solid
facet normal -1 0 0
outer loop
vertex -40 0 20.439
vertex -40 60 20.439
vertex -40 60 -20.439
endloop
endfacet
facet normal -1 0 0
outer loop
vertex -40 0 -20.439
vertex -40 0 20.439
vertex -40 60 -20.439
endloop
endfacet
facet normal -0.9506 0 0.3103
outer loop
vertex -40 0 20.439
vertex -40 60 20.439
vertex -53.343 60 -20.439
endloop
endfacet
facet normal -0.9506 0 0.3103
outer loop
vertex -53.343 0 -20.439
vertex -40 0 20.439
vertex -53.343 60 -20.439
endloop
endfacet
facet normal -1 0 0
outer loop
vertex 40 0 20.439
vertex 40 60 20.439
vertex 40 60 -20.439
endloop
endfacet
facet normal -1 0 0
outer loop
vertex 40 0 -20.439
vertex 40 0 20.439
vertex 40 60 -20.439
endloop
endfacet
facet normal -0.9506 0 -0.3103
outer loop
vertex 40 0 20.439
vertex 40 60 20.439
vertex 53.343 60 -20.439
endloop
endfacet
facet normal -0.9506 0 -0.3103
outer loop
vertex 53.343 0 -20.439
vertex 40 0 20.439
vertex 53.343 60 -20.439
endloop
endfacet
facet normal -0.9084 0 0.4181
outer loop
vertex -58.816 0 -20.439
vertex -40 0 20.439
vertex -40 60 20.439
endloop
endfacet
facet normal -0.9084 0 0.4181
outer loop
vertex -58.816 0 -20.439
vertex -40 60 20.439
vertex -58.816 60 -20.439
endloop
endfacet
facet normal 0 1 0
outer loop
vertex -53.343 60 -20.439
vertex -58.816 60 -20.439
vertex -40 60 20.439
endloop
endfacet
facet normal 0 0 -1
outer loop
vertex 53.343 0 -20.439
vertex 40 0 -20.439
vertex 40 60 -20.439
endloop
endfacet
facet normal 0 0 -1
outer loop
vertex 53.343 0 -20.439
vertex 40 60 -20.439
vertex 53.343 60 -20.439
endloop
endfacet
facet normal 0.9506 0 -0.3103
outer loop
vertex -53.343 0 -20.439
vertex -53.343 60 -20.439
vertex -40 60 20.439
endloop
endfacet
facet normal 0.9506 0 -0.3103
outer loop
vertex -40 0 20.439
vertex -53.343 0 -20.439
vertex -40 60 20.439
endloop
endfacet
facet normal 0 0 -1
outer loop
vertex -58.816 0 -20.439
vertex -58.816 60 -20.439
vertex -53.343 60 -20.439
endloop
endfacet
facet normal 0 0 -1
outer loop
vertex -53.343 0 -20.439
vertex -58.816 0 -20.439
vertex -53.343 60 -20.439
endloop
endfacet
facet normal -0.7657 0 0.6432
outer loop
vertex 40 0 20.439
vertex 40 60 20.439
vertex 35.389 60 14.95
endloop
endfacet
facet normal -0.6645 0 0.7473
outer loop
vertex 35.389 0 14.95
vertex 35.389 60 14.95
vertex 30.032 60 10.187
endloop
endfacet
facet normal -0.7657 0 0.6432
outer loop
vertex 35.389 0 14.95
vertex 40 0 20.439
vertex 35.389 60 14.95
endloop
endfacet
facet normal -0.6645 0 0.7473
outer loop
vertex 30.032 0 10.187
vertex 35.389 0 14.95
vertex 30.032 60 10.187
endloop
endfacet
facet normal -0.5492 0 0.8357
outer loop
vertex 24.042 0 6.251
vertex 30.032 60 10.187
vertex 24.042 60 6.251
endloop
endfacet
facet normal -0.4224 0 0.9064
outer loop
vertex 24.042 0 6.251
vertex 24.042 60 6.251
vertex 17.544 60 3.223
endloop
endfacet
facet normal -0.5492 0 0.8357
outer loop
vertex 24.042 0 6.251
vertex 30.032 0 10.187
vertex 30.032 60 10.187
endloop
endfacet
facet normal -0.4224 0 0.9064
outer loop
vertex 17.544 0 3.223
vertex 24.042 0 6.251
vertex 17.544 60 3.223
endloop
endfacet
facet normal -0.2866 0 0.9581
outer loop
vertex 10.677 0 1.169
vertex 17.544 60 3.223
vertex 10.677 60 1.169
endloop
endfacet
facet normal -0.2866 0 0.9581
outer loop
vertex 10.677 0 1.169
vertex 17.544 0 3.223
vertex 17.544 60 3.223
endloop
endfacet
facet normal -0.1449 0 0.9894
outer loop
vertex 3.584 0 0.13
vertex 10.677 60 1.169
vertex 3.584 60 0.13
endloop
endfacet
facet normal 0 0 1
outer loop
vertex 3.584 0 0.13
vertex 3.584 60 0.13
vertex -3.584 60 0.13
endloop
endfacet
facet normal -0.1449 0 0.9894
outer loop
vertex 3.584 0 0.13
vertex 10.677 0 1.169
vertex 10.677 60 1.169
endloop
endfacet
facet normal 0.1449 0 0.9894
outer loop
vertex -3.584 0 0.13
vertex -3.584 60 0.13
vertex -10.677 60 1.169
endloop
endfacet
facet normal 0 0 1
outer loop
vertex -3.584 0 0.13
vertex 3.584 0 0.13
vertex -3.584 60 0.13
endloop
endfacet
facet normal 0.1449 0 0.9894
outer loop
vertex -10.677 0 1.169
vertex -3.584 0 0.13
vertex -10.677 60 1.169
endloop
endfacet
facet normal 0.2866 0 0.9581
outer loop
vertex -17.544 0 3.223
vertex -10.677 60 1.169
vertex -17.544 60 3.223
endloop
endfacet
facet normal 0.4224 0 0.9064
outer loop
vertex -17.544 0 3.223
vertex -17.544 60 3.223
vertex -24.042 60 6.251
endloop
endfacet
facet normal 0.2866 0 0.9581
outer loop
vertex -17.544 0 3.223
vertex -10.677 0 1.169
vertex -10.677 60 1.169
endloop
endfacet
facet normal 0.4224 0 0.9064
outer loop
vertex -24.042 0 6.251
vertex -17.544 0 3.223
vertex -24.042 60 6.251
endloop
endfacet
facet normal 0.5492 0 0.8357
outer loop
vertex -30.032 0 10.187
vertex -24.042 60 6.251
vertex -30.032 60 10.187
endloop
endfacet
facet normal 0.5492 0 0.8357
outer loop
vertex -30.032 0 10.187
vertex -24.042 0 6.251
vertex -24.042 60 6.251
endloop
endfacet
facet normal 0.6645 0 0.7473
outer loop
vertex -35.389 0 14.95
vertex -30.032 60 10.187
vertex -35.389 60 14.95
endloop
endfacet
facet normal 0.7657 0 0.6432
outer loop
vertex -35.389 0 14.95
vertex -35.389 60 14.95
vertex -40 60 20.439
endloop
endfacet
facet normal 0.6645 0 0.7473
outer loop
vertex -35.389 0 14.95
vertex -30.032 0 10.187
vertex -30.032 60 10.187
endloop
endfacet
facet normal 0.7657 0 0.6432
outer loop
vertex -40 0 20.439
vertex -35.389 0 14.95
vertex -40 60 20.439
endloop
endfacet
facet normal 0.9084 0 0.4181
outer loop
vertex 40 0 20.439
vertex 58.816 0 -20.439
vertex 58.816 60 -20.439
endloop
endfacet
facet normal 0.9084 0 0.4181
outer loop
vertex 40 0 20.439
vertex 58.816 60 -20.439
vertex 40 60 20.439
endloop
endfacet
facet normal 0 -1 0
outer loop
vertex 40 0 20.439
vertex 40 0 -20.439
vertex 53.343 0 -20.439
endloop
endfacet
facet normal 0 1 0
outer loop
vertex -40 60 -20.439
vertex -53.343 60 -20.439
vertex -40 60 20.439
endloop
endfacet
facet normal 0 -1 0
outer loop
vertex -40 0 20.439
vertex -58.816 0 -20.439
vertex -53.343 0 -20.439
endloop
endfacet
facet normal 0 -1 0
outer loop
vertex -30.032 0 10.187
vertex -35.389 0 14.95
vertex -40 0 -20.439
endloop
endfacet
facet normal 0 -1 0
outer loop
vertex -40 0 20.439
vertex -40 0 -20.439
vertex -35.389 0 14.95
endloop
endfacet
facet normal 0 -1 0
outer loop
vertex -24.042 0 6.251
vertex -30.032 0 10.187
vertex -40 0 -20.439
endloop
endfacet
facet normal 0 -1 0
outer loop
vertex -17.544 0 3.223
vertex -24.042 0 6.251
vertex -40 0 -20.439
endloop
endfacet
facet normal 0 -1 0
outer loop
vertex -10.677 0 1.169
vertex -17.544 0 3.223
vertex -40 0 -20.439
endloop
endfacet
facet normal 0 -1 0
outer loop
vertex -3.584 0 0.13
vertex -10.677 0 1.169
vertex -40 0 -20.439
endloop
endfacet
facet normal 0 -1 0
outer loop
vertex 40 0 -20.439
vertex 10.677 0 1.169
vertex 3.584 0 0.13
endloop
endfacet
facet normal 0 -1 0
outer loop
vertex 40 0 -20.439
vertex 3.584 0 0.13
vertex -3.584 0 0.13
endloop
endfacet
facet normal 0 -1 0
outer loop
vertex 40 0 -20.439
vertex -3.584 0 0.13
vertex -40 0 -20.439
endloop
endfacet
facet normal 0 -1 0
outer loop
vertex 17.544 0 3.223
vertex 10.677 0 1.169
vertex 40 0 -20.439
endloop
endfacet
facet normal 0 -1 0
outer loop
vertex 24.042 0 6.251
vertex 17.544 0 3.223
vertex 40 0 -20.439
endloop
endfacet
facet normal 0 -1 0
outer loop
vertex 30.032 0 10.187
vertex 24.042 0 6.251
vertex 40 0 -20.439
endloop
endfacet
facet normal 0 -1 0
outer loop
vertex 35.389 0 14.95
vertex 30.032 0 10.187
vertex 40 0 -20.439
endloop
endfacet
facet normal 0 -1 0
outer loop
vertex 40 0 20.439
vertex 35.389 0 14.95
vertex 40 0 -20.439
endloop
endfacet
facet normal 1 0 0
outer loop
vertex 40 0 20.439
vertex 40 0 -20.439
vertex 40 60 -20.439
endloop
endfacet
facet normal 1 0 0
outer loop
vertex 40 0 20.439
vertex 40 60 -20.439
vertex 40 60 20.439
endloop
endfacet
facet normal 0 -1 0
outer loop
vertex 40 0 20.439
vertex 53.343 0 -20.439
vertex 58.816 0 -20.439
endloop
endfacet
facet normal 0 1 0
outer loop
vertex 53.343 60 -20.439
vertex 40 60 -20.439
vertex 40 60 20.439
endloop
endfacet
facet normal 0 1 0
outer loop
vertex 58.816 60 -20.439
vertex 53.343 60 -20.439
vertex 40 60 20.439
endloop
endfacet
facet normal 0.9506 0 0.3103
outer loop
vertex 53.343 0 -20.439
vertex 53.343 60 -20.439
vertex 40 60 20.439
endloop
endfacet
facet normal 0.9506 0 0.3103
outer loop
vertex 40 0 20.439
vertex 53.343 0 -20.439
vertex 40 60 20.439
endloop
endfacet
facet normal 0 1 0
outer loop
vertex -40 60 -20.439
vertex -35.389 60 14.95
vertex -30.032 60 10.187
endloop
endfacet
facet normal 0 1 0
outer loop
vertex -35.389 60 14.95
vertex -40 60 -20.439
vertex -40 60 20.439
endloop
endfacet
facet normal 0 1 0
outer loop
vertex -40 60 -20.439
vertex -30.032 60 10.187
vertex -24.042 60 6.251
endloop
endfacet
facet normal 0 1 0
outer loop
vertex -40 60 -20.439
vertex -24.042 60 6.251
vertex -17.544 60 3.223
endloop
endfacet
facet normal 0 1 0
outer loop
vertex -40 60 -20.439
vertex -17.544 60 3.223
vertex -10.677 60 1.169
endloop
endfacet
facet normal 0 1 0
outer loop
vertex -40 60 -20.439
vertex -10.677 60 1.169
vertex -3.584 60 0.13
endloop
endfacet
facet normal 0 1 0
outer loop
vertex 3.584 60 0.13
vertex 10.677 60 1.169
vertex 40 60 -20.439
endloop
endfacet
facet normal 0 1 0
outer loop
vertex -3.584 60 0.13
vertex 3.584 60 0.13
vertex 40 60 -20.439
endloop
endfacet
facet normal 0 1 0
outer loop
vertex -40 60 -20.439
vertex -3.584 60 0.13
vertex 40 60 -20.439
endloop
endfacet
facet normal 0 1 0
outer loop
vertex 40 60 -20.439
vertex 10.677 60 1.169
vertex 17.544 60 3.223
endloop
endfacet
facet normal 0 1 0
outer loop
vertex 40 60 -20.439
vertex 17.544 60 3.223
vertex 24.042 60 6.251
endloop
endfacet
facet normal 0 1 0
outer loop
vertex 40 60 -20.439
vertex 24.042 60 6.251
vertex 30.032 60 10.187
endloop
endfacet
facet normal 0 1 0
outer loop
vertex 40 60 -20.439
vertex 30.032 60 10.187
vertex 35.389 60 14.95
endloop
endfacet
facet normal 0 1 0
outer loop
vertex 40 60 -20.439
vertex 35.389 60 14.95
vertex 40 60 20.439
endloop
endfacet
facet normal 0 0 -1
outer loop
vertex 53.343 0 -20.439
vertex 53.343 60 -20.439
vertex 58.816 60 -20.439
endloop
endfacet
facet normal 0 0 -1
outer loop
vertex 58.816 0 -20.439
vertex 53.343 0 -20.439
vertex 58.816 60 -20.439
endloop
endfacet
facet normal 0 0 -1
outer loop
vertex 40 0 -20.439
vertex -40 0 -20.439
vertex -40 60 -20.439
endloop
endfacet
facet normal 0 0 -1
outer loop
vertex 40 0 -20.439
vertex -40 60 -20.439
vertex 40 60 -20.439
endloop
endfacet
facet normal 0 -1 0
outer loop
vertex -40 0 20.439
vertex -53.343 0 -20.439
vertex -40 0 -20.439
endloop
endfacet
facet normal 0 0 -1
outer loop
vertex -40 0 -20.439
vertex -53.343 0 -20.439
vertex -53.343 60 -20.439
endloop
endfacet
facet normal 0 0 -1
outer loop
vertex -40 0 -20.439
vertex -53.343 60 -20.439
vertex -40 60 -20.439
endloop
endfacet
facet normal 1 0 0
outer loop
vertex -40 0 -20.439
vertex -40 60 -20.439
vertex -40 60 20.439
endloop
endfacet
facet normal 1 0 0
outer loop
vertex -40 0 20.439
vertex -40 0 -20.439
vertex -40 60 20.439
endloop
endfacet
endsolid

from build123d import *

# Parameters (mm, degrees)
F1_DEPTH = 60
F2_DEPTH = 60
F3_DEPTH = 60


with BuildPart() as f1:
    # F0 (on Front) → F1 (new body)
    with BuildSketch(Plane.XZ):
        with BuildLine():
            Line((-40, -20.43877), (40, -20.43877))
            Line((40, -20.43877), (40, 20.43877))
            ThreePointArc((40, 20.43877), (0, 0), (-40, 20.43877))
            Line((-40, 20.43877), (-40, -20.43877))
        make_face()
    extrude(amount=-F1_DEPTH)


with BuildPart() as f2:
    # F0 (on Front) → F2 (new body)
    with BuildSketch(Plane.XZ):
        Polygon((-53.342666, -20.43877), (-40, 20.43877), (-58.815598, -20.43877), align=None)
        Polygon((58.815598, -20.43877), (40, 20.43877), (53.342666, -20.43877), align=None)
    extrude(amount=-F2_DEPTH)


with BuildPart() as f3:
    # F0 (on Front) → F3 (new body)
    with BuildSketch(Plane.XZ):
        Polygon((-53.342666, -20.43877), (-40, -20.43877), (-40, 20.43877), align=None)
        Polygon((40, 20.43877), (40, -20.43877), (53.342666, -20.43877), align=None)
    extrude(amount=-F3_DEPTH)


solid = Compound([f1.part, f2.part, f3.part])
